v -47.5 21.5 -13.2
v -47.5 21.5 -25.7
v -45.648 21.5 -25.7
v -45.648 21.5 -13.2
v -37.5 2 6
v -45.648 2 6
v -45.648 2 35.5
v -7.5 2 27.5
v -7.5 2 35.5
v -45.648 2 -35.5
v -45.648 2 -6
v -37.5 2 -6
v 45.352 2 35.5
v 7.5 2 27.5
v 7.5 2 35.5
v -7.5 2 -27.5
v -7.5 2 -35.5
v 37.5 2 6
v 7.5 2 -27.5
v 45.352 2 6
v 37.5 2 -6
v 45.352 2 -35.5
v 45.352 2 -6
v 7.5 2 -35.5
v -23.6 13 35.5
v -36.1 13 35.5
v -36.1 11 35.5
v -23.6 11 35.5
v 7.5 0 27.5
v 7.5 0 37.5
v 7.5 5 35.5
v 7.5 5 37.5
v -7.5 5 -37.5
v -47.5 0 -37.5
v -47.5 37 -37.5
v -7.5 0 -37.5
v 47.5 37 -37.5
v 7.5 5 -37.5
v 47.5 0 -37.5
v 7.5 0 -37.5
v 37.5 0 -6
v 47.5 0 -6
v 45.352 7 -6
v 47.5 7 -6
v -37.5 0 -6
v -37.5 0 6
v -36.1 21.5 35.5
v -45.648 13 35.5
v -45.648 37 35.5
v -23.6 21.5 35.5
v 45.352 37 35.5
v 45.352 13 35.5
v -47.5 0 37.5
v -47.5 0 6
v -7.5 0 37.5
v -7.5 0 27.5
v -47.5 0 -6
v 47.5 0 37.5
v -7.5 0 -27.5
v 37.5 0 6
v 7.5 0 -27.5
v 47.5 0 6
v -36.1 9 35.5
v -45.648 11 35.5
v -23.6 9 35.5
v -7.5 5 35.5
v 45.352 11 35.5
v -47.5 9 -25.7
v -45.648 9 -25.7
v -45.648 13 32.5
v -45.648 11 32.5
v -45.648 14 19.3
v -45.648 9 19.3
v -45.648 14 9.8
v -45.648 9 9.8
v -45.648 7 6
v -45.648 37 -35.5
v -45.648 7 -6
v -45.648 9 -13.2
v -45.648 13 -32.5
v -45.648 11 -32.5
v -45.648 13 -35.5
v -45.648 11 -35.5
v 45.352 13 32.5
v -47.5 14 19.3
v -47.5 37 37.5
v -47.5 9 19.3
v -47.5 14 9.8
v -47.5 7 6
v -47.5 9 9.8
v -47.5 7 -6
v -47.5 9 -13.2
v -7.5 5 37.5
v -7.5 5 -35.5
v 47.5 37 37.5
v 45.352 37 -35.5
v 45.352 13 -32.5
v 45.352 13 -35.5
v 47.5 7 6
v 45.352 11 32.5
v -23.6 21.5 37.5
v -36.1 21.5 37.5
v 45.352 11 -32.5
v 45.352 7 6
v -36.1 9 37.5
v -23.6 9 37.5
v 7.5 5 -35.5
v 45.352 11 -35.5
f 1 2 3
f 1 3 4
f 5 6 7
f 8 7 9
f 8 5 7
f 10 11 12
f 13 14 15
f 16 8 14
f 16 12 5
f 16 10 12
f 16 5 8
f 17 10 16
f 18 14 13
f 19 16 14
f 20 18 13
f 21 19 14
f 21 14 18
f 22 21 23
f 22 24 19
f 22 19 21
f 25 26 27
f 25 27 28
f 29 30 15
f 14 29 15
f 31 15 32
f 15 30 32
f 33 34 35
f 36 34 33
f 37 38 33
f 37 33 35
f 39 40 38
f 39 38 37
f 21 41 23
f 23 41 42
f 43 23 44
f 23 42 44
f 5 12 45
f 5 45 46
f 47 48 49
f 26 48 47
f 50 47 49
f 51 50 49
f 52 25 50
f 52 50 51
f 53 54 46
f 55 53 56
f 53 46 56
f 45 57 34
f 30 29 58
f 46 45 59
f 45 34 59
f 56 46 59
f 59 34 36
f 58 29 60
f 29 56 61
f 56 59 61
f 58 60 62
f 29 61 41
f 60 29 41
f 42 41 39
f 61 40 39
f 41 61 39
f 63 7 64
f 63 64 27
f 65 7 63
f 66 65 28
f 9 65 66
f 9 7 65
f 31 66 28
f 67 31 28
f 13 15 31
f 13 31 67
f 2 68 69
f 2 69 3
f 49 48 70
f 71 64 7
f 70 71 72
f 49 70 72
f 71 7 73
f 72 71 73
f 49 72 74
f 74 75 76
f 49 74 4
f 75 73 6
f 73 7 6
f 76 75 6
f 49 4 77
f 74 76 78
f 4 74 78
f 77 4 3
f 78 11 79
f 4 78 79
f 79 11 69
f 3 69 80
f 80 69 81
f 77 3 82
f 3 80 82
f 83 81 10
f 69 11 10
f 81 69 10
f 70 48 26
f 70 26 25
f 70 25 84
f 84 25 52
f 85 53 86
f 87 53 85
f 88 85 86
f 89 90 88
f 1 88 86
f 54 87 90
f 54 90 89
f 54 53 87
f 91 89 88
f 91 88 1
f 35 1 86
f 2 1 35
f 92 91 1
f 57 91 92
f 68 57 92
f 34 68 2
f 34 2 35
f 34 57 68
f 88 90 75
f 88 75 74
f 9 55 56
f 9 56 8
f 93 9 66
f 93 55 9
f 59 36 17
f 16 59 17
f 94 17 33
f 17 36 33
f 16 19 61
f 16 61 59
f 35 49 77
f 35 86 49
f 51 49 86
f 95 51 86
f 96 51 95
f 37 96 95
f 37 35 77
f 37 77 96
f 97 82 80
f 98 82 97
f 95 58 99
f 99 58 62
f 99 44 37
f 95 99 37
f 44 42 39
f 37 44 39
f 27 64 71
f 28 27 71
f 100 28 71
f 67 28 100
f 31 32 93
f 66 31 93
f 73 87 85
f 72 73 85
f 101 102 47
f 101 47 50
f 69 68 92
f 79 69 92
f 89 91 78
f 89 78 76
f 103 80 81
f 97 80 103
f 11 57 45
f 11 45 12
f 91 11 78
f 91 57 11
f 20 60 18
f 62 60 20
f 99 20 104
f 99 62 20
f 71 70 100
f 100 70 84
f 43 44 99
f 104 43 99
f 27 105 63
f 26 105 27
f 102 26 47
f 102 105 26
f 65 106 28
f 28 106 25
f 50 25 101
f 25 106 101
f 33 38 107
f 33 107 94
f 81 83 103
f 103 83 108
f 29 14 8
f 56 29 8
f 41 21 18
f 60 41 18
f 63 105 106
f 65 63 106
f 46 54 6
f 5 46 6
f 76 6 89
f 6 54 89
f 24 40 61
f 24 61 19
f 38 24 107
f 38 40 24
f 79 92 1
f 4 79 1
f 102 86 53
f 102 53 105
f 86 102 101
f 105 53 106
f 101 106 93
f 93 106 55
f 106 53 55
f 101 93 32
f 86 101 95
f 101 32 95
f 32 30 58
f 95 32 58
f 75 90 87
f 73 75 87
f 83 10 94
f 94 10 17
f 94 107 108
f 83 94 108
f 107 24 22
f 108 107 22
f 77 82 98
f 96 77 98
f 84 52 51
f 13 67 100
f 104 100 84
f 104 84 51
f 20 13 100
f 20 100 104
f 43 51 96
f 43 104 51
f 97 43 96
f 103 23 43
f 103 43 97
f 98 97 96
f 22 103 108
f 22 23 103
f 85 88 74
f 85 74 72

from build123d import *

# Parameters (mm, degrees)
SKETCH1_W           = 95
SKETCH1_H           = 75
BOSS_EXTRUDE1_DEPTH = 2
SKETCH2_W           = 95
SKETCH2_H           = 75
SKETCH2_W_2         = 91
SKETCH2_H_2         = 71
BOSS_EXTRUDE2_DEPTH = 35
SKETCH3_W           = 12.5
SKETCH3_H           = 12.5
CUT_EXTRUDE1_DEPTH  = 10
SKETCH4_W           = 12.5
SKETCH4_H           = 12.5
CUT_EXTRUDE2_DEPTH  = 10
SKETCH5_W           = 9.5
SKETCH5_H           = 5
CUT_EXTRUDE3_DEPTH  = 10
SKETCH6_W           = 15
SKETCH6_H           = 5
CUT_EXTRUDE4_DEPTH  = 10
SKETCH7_W           = 12
SKETCH7_H           = 7
CUT_EXTRUDE5_DEPTH  = 10
SKETCH8_W           = 91
SKETCH8_H           = 2
BOSS_EXTRUDE3_DEPTH = 3


with BuildPart() as part:
    # Sketch1 → Boss-Extrude1 (new body)
    with BuildSketch(Plane(origin=(0, 0, 0), x_dir=(1, 0, 0), z_dir=(0, 1, 0))):
        Rectangle(SKETCH1_W, SKETCH1_H)
    extrude(amount=BOSS_EXTRUDE1_DEPTH)

    # Sketch2 → Boss-Extrude2 (add)
    with BuildSketch(Plane(origin=(0, 2, 0), x_dir=(1, 0, 0), z_dir=(0, 1, 0))):
        Rectangle(SKETCH2_W, SKETCH2_H)
        with Locations((-0.148465207, 0)):
            Rectangle(SKETCH2_W_2, SKETCH2_H_2, mode=Mode.SUBTRACT)
    extrude(amount=BOSS_EXTRUDE2_DEPTH)

    # Sketch3 → Cut-Extrude1 (cut)
    with BuildSketch(Plane.XY.offset(37.5)):
        with Locations((-29.85, 15.25)):
            Rectangle(SKETCH3_W, SKETCH3_H)
    extrude(amount=-CUT_EXTRUDE1_DEPTH, mode=Mode.SUBTRACT)

    # Sketch4 → Cut-Extrude2 (cut)
    with BuildSketch(Plane.ZY.offset(47.5)):
        with Locations((-19.45, 15.25)):
            Rectangle(SKETCH4_W, SKETCH4_H)
    extrude(amount=-CUT_EXTRUDE2_DEPTH, mode=Mode.SUBTRACT)

    # Sketch5 → Cut-Extrude3 (cut)
    with BuildSketch(Plane.ZY.offset(47.5)):
        with Locations((14.55, 11.5)):
            Rectangle(SKETCH5_W, SKETCH5_H)
    extrude(amount=-CUT_EXTRUDE3_DEPTH, mode=Mode.SUBTRACT)

    # Sketch6 → Cut-Extrude4 (cut)
    with BuildSketch(Plane(origin=(0, 0, -37.5), x_dir=(-1, 0, 0), z_dir=(0, 0, -1))):
        with Locations((0, 2.5)):
            Rectangle(SKETCH6_W, SKETCH6_H)
    cut_extrude4 = extrude(amount=-CUT_EXTRUDE4_DEPTH, mode=Mode.SUBTRACT)

    # Mirror1: Cut-Extrude4 across plane
    add(cut_extrude4.mirror(Plane.XY), mode=Mode.SUBTRACT)

    # Sketch7 → Cut-Extrude5 (cut)
    with BuildSketch(Plane.ZY.offset(47.5)):
        with Locations((0, 3.5)):
            Rectangle(SKETCH7_W, SKETCH7_H)
    cut_extrude5 = extrude(amount=-CUT_EXTRUDE5_DEPTH, mode=Mode.SUBTRACT)

    # Mirror2: Cut-Extrude5 across plane
    add(cut_extrude5.mirror(Plane(origin=(0, 0, 0), x_dir=(0, 0, 1), z_dir=(1, 0, 0))), mode=Mode.SUBTRACT)

    # Sketch8 → Boss-Extrude3 (add)
    with BuildSketch(Plane.XY.offset(-35.5)):
        with Locations((-0.148465207, 12)):
            Rectangle(SKETCH8_W, SKETCH8_H)
    boss_extrude3 = extrude(amount=BOSS_EXTRUDE3_DEPTH)

    # Mirror3: Boss-Extrude3 across plane
    add(boss_extrude3.mirror(Plane.XY))


solid = part.part
